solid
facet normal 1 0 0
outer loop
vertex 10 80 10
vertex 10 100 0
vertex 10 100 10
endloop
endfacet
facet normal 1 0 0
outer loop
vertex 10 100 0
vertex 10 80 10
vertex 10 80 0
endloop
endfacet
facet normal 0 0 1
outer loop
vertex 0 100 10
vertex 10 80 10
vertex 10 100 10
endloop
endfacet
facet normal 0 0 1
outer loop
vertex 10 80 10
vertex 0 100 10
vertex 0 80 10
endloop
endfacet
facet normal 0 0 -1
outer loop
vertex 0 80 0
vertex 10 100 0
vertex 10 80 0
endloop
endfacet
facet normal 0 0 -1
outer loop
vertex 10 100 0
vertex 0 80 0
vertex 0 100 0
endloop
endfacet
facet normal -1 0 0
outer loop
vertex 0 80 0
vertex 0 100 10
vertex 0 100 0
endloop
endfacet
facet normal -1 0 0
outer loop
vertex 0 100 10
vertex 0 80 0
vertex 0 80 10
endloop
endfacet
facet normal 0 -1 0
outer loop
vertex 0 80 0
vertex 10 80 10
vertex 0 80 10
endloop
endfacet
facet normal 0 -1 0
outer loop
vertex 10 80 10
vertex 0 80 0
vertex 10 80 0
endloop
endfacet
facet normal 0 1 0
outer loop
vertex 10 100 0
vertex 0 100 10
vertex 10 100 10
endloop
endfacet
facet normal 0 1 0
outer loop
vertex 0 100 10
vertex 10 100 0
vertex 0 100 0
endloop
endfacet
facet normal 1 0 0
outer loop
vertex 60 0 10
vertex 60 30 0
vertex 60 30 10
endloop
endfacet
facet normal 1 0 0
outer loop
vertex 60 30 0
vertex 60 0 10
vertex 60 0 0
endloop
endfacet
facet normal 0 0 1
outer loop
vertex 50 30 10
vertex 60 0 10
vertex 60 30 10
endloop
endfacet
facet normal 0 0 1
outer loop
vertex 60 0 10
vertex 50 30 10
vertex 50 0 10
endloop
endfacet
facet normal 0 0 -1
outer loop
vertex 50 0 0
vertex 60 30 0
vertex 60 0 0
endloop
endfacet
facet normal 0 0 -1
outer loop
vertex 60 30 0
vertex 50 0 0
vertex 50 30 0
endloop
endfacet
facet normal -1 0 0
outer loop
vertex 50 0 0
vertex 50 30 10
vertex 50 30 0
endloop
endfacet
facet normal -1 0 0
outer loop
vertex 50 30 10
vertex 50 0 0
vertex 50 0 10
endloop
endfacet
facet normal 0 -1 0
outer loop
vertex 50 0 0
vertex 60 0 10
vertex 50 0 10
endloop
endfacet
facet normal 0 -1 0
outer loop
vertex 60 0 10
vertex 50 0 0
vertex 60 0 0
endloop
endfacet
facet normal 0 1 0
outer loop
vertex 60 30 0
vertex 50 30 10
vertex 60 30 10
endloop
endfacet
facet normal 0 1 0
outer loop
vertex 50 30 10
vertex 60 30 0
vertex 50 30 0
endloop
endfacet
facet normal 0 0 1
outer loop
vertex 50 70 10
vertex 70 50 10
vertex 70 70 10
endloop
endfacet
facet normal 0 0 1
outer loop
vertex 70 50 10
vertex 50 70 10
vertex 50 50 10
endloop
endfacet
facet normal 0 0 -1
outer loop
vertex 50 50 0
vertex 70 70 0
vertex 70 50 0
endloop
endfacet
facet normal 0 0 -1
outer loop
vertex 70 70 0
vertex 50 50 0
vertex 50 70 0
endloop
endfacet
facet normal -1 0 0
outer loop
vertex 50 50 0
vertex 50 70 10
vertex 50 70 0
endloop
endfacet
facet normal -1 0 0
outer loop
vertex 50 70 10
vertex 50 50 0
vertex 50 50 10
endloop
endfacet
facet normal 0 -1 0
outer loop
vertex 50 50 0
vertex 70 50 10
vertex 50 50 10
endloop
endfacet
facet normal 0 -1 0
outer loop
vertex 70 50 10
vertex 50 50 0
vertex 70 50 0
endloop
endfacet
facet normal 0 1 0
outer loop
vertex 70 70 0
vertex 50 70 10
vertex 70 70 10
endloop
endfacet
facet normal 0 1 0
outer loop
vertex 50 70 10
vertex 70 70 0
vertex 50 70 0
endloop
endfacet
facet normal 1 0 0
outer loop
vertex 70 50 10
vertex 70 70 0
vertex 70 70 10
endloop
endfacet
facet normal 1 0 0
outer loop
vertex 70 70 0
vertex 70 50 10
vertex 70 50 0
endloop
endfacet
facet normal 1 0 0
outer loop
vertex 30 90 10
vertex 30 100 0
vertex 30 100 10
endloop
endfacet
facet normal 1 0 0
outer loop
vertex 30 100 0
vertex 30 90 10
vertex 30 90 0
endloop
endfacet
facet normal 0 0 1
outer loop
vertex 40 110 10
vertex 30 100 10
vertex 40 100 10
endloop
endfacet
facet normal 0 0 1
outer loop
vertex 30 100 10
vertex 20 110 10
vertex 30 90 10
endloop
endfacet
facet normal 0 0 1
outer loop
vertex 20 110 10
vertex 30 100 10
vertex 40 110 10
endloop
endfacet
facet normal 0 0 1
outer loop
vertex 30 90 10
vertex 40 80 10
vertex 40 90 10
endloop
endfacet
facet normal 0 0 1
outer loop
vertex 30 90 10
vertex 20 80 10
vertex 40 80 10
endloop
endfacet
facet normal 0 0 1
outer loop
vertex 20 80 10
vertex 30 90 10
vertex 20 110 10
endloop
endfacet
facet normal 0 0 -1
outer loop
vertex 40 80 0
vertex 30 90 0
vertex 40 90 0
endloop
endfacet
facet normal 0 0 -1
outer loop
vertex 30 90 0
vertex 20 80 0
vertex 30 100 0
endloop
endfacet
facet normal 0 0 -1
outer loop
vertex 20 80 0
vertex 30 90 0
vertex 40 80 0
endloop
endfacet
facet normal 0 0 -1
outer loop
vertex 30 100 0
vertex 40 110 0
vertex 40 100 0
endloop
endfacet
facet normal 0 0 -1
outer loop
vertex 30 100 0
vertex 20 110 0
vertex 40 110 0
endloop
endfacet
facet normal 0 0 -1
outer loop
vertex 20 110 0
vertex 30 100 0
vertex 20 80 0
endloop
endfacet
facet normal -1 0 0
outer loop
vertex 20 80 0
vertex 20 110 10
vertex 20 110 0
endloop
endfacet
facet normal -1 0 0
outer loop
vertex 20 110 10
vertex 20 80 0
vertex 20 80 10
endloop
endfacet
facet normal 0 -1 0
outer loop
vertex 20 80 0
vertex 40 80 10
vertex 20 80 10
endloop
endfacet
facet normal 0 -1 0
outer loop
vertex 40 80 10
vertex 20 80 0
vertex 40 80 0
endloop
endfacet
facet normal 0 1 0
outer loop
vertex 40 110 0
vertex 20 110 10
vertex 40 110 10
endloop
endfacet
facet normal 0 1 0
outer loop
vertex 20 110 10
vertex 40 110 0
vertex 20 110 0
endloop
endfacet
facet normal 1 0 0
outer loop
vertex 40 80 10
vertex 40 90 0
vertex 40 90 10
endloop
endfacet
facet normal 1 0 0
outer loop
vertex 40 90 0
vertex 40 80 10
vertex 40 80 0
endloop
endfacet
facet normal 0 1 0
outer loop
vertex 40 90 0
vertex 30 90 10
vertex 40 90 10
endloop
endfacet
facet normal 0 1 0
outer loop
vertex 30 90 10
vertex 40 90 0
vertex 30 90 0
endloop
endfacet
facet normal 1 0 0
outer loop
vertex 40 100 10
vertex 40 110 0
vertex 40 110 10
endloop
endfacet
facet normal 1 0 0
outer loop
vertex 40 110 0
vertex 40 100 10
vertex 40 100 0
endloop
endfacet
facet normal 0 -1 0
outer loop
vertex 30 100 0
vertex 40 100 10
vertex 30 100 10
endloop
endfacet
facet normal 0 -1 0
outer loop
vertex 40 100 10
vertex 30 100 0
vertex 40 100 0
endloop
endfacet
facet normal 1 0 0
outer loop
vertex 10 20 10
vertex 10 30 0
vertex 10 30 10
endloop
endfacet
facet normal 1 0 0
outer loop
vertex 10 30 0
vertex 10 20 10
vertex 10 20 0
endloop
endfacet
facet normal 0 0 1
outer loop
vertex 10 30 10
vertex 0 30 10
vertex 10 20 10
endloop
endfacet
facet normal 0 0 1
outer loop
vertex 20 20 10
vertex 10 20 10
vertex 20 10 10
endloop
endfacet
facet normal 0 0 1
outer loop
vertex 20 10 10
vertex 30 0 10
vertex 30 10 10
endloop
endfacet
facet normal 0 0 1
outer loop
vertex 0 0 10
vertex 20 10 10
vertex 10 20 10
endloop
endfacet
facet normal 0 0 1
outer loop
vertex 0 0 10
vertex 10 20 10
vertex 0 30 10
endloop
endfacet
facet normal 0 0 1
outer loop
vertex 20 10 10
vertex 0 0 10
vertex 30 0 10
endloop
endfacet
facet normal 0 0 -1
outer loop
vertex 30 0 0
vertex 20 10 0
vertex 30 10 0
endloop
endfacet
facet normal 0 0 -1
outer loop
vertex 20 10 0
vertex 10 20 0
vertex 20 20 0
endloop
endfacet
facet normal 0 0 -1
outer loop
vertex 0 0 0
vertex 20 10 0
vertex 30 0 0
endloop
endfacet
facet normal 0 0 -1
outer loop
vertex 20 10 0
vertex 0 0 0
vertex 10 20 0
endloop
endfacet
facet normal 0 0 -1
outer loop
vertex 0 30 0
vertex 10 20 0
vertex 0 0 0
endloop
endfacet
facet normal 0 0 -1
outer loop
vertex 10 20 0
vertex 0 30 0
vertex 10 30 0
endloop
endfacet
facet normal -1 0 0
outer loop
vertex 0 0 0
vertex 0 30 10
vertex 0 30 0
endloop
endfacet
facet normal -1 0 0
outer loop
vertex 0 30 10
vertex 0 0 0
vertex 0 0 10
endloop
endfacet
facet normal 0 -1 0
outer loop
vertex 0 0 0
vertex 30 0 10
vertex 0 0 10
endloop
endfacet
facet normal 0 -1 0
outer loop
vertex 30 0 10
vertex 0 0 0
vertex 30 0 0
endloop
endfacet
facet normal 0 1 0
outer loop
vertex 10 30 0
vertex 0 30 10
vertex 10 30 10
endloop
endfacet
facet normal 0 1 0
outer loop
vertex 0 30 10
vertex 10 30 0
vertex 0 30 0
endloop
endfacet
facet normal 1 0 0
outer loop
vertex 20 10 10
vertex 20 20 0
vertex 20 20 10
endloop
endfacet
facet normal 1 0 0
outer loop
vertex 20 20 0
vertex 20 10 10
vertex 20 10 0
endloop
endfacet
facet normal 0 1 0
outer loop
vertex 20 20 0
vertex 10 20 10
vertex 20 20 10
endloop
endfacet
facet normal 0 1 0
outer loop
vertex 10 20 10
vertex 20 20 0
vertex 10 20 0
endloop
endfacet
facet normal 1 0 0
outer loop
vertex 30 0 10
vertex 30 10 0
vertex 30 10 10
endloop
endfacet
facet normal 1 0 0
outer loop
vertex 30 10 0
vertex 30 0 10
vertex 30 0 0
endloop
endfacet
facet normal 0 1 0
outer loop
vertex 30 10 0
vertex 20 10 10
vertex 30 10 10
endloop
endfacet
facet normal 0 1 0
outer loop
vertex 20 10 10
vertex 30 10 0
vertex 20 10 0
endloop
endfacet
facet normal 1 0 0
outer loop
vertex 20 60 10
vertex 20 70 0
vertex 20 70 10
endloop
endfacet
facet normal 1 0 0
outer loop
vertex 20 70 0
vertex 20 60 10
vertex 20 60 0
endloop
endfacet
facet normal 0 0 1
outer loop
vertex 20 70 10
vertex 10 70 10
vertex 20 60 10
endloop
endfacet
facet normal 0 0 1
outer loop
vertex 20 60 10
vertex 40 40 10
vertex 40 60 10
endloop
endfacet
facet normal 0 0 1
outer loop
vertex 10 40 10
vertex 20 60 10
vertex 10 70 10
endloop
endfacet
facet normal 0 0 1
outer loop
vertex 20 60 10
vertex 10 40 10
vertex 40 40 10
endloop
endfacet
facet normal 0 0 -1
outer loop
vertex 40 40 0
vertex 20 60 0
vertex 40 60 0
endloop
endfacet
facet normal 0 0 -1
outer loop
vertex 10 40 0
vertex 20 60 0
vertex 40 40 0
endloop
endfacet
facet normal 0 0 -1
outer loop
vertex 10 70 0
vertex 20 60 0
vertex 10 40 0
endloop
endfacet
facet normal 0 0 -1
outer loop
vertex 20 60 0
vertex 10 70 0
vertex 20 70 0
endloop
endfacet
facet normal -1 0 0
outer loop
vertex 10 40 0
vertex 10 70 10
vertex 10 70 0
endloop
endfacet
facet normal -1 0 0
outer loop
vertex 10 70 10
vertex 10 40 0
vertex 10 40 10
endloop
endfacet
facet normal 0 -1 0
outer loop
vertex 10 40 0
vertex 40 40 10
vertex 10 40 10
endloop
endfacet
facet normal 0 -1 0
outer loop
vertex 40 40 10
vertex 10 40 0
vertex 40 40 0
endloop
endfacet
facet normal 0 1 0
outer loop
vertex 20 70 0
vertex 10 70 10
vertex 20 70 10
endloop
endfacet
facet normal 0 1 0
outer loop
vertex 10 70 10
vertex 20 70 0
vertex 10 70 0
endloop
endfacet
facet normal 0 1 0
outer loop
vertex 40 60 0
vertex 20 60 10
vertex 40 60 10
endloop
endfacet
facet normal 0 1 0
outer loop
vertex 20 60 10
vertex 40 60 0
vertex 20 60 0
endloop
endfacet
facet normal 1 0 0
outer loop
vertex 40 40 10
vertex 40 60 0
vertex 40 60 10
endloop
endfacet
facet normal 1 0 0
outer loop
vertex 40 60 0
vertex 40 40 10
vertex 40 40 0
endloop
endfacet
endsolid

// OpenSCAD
//Bedlam cube//
      
//pieza2    
module pieza2(unidad){
    translate([0,0,0]){
     cube([unidad,unidad,unidad]);}
    translate([0,unidad,0]){
     cube([unidad,unidad,unidad]);} 
     }
                  
//pieza3
module pieza3(unidad){
   pieza2(unidad);
    translate([0,2*unidad,0]){
     cube(unidad);}}     

//pieza4     
module pieza4(unidad){  
    pieza2(unidad);
    translate([unidad,0,0]){
     pieza2(unidad);
        }}  

//pieza5
module pieza5(unidad){
    pieza3(unidad);
    translate([unidad,0,0]){
     cube(unidad);}
    translate([unidad,2*unidad,0]){
     cube(unidad);} } 
    
//pieza6
module pieza6(unidad){
 pieza3(unidad);
 translate([unidad,0,0]){   
    pieza2(unidad);}   
 translate([2*unidad,0,0]){
     cube([unidad,unidad,unidad]);}  
 }
 
//pieza7
module pieza7(unidad){
 pieza3(unidad);
 translate([unidad,0,0]){   
    pieza2(unidad);}   
 translate([2*unidad,0,0]){
    pieza2(unidad);}  
 } 
  
translate([0,80,0]){       
pieza2(10);} 
translate([50,0,0]){ 
pieza3(10);}
translate([50,50,0]){
pieza4(10);}
translate([20,80,0]){ 
pieza5(10);}        
translate([0,00,0]){ 
pieza6(10);}  
translate([10,40,0]){ 
pieza7(10);}
 
